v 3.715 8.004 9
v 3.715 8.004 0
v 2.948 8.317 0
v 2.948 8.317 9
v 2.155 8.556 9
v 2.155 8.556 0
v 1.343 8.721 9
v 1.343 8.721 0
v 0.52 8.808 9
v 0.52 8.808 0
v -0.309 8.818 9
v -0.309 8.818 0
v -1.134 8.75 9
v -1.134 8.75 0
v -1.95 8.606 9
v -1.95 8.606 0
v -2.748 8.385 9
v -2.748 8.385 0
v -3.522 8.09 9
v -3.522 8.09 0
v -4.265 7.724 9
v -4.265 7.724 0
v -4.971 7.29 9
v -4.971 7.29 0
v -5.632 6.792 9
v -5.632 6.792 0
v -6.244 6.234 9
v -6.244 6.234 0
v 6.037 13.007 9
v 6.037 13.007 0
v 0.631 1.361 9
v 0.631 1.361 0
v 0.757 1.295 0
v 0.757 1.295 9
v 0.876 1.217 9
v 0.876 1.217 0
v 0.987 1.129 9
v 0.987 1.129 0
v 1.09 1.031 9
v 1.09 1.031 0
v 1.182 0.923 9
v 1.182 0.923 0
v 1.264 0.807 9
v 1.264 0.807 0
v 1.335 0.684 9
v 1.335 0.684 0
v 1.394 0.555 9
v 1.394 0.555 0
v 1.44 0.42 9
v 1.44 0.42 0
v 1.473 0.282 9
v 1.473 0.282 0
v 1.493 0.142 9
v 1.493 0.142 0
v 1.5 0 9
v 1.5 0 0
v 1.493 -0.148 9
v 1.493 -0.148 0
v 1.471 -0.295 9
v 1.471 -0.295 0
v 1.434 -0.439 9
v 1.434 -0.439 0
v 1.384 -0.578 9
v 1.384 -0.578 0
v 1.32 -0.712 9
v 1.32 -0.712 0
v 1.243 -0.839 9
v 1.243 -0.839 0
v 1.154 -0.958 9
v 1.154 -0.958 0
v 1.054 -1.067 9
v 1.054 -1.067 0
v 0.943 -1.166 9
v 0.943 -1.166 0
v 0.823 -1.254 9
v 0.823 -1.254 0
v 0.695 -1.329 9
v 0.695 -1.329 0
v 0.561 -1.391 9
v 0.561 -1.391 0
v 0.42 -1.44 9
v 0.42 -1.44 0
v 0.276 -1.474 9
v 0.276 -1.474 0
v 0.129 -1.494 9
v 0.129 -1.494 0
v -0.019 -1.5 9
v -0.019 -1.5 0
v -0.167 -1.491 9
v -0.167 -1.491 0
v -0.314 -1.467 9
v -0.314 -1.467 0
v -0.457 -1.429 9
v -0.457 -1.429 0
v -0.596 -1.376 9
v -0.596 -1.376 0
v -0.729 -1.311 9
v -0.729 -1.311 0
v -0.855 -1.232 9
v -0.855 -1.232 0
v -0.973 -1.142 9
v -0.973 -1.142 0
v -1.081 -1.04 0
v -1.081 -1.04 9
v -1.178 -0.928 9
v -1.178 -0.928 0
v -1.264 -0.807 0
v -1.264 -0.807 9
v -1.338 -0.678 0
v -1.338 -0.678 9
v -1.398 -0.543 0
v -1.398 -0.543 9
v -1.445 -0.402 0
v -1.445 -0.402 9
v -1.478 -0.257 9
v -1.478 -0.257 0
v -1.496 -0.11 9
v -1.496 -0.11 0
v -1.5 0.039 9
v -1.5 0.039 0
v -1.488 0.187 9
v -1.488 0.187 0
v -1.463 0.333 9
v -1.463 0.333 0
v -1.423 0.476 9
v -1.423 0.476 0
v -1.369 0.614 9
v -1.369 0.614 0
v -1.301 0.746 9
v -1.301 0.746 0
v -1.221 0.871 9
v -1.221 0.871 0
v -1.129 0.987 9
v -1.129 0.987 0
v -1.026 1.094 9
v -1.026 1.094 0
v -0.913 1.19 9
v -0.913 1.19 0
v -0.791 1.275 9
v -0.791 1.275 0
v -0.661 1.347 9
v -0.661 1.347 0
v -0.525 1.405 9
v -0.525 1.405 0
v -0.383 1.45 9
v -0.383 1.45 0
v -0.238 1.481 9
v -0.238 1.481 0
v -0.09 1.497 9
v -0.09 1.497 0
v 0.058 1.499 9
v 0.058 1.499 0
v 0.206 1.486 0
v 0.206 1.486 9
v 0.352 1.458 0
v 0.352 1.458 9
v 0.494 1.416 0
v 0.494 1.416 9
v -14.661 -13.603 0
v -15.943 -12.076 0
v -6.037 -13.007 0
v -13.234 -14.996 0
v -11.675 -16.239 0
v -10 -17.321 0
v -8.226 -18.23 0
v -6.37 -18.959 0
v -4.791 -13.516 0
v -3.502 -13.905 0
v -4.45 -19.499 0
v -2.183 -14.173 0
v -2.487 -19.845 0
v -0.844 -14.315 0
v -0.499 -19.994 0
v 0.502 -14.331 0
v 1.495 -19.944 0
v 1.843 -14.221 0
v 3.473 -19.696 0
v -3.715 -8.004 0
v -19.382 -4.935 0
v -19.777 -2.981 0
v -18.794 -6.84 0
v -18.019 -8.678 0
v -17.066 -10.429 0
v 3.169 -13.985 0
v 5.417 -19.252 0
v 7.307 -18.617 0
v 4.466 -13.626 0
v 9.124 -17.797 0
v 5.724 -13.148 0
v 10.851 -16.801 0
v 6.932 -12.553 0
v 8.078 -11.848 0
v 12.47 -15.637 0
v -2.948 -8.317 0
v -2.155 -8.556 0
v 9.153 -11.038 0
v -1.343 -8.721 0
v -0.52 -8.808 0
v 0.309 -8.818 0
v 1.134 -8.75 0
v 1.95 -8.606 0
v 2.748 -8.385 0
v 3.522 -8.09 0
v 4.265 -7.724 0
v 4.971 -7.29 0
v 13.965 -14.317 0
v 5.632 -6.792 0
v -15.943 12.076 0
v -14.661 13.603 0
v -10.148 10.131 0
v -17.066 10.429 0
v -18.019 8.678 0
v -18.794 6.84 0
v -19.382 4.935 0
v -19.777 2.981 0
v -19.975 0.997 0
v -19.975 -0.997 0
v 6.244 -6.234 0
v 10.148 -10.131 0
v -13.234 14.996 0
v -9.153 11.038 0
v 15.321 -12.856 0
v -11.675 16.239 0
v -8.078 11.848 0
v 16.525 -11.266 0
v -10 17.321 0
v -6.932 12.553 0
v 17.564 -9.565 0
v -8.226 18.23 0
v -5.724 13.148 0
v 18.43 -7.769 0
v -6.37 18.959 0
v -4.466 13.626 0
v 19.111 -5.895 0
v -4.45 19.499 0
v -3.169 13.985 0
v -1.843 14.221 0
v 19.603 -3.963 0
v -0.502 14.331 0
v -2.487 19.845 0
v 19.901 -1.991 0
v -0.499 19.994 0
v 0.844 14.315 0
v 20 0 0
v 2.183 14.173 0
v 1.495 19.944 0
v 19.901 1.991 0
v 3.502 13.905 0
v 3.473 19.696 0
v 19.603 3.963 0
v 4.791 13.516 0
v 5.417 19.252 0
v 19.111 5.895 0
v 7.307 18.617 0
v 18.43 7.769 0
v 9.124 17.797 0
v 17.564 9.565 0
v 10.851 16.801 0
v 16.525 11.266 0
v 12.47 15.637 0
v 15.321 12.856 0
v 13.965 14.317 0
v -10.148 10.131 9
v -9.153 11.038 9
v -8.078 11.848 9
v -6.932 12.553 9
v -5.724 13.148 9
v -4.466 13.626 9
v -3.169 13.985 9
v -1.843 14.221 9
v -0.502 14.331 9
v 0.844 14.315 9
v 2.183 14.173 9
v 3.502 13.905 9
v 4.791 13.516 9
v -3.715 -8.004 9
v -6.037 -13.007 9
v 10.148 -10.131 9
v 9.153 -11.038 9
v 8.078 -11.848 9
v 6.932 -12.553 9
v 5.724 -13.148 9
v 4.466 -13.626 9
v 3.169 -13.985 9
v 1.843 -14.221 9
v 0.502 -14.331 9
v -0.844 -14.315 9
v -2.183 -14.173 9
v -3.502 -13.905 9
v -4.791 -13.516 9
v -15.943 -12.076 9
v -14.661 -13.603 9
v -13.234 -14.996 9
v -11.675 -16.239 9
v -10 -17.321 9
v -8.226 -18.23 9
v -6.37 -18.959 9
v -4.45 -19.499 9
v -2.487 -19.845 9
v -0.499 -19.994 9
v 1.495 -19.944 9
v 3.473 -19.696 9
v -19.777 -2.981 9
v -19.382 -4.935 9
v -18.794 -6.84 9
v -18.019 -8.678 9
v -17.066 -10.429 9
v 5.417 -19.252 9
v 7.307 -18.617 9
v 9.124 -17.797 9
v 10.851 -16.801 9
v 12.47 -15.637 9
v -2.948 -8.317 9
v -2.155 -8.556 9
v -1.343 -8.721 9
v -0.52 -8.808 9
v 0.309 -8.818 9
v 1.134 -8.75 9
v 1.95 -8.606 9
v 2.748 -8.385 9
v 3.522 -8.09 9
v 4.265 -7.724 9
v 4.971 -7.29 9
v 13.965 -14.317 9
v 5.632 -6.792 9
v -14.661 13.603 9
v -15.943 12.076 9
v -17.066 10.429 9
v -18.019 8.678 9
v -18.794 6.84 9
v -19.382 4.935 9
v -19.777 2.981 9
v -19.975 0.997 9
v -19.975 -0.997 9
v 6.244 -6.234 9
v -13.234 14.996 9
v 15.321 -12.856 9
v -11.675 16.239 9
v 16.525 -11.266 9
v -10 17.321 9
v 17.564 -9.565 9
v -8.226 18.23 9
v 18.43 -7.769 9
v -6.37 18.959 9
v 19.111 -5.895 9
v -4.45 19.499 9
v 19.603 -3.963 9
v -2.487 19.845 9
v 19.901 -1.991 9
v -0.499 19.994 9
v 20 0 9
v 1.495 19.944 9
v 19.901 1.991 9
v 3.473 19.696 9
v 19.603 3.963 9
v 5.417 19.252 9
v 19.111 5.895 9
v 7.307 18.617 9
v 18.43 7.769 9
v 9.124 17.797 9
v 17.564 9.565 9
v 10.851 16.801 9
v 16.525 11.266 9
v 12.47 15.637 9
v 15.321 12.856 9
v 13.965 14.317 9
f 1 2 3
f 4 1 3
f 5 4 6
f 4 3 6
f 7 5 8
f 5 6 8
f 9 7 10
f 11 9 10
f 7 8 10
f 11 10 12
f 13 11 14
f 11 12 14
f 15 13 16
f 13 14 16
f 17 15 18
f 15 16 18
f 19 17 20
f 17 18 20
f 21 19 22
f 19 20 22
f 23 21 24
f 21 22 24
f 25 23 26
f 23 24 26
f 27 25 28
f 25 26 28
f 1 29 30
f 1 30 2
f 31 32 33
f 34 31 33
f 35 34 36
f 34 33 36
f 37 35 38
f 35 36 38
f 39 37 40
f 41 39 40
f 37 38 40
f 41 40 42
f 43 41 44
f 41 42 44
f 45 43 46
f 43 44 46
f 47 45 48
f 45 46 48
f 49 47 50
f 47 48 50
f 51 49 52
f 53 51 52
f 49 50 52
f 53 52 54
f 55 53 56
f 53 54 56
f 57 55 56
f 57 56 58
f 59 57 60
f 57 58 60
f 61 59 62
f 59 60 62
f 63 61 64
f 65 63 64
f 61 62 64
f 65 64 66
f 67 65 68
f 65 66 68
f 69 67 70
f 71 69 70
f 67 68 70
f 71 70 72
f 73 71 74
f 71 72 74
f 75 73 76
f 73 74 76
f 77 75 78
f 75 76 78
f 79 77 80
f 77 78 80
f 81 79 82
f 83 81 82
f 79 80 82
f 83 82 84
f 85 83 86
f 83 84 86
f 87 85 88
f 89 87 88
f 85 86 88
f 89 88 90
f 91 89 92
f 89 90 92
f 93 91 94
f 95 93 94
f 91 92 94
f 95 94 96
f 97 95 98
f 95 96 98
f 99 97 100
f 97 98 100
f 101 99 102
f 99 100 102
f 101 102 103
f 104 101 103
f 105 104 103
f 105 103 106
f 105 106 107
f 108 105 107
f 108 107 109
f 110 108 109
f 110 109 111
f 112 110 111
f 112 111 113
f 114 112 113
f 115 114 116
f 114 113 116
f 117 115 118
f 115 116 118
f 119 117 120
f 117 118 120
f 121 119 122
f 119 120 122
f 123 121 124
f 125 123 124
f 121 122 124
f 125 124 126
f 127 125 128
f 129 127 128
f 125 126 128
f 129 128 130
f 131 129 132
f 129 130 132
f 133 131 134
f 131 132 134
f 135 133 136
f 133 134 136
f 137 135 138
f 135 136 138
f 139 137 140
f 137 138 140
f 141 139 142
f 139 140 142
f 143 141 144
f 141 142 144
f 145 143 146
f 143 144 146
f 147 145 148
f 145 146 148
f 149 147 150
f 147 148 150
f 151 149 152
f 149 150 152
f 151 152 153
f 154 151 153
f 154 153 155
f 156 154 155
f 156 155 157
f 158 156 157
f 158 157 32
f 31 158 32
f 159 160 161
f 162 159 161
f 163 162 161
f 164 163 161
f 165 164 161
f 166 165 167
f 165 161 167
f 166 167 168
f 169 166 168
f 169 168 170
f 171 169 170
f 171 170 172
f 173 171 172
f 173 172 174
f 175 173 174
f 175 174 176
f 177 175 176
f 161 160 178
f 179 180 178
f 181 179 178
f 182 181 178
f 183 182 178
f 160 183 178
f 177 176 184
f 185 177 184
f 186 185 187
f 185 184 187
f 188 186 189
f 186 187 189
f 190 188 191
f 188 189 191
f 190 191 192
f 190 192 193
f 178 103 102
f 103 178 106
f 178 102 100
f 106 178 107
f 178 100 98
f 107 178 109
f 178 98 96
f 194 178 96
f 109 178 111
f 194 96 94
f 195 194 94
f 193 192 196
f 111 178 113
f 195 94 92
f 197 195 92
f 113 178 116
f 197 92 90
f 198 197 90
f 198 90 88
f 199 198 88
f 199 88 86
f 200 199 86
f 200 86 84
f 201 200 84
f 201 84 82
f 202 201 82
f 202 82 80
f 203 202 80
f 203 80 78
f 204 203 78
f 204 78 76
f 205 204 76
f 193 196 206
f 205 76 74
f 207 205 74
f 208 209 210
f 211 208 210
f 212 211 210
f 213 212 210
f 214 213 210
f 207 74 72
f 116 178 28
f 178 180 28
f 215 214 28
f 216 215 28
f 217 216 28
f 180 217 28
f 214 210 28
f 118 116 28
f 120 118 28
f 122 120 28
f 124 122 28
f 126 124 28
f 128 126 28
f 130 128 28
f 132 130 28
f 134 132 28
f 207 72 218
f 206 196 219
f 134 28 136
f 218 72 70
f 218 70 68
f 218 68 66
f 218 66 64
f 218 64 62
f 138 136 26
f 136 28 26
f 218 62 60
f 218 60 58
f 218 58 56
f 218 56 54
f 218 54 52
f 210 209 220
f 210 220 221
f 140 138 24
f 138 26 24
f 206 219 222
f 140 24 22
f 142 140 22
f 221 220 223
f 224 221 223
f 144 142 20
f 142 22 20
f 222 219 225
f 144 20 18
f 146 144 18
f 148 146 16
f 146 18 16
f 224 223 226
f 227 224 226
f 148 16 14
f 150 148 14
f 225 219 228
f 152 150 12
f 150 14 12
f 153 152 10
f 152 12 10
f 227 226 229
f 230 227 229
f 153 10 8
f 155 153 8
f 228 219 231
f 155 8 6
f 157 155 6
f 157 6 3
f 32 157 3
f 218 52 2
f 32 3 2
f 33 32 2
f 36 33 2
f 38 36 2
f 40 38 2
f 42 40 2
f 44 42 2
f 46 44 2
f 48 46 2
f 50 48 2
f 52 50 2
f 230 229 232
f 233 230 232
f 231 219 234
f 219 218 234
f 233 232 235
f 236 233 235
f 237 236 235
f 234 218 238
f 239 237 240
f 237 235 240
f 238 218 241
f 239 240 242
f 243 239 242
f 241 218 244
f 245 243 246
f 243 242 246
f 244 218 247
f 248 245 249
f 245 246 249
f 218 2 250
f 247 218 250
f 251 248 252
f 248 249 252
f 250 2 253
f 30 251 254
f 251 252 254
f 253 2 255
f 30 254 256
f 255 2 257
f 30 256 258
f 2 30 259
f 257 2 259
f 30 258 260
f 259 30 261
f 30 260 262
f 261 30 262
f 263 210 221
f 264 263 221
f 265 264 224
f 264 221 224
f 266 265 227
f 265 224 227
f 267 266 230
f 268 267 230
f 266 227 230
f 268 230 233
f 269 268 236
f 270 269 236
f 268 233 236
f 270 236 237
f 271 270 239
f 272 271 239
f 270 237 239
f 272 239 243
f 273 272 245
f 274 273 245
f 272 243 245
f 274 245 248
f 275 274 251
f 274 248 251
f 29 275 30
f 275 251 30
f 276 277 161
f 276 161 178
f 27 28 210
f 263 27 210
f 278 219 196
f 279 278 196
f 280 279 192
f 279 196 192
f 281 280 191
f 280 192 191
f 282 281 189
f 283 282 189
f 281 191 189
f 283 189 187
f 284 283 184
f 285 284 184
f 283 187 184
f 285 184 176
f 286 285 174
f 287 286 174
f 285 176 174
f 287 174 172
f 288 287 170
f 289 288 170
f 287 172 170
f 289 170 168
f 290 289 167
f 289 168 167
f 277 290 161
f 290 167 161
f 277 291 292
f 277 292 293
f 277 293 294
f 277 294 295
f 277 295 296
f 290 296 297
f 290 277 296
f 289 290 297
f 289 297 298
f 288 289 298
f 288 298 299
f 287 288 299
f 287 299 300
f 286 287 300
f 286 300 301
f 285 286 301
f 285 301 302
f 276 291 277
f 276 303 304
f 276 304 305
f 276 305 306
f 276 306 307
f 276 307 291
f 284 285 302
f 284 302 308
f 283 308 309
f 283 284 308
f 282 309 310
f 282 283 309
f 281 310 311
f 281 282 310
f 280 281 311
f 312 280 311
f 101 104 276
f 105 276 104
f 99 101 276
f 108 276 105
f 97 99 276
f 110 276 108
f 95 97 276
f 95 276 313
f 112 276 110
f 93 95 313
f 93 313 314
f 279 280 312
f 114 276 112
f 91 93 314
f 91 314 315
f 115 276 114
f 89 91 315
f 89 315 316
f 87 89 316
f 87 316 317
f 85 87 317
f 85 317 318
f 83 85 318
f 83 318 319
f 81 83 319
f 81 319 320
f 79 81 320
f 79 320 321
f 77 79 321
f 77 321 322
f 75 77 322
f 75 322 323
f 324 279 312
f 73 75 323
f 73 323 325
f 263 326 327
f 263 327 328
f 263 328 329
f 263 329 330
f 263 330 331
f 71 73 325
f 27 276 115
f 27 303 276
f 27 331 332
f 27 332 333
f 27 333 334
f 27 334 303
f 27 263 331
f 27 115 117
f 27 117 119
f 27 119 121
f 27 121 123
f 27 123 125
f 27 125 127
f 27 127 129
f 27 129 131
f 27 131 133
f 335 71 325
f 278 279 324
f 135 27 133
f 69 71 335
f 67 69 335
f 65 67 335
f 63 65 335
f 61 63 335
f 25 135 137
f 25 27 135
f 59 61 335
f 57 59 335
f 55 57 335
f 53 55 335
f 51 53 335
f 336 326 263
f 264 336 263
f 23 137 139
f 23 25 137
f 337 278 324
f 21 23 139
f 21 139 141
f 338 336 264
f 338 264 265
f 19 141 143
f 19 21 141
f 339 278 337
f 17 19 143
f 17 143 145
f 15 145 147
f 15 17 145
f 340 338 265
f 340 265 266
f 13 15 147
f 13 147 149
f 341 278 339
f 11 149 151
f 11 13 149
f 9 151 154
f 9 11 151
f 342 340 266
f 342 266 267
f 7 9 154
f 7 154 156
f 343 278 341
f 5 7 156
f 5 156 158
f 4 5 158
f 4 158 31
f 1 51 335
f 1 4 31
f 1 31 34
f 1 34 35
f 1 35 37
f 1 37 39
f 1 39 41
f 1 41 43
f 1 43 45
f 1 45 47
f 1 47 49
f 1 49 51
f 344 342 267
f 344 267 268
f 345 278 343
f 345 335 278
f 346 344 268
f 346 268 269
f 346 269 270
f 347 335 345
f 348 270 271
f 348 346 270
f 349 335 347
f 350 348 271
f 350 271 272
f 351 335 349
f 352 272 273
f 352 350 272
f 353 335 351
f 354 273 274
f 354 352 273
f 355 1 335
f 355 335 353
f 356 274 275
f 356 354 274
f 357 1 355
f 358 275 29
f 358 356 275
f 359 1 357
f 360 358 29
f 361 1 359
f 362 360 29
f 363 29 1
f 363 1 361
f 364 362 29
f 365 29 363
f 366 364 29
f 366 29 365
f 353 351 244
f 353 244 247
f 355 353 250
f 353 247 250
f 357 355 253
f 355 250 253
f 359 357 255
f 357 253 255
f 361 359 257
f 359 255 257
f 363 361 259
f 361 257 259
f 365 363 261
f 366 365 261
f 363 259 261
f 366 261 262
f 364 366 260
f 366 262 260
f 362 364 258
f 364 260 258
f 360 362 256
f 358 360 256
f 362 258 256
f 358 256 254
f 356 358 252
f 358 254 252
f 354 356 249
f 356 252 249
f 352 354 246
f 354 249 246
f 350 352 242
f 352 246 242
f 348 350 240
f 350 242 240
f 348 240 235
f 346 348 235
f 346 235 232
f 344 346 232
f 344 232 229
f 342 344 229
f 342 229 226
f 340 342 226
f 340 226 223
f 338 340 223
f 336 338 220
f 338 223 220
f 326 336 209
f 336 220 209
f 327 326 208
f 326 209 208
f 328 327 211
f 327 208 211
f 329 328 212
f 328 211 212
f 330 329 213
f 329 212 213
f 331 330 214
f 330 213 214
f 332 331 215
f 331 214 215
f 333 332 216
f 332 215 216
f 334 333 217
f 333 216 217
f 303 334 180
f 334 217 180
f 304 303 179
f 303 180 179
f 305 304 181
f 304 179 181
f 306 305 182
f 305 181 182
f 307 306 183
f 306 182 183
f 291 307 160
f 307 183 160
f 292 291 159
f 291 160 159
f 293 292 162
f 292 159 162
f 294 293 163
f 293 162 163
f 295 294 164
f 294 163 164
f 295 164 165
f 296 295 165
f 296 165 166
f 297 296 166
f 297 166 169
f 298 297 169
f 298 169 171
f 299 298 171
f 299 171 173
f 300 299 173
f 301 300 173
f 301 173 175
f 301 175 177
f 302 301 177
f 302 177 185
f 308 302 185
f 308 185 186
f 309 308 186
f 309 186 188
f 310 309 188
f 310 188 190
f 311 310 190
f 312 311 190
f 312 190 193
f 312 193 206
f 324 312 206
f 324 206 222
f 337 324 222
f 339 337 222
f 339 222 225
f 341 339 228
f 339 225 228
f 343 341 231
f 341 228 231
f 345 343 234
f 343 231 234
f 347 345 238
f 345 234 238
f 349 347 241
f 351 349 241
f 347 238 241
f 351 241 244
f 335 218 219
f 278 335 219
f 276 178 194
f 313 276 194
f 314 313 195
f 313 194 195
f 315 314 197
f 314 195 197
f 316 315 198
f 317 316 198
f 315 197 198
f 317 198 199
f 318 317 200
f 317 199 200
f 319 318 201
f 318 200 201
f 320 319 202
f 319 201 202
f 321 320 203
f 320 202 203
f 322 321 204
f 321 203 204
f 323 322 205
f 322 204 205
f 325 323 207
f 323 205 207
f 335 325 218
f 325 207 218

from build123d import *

# Parameters (mm, degrees)
F0_R     = 20
F1_DEPTH = 9


# Not quite as in the source:
# - a feature names something its author has since deleted; it is built from what else it names


with BuildPart() as f1:
    # F0 (on Top) → F1 (new body)
    with BuildSketch(Plane.XY):
        Circle(F0_R)
        with BuildLine():
            Line((-6.0368402564, -13.007011068), (-3.7146515348, -8.0036097652))
            ThreePointArc((-3.7146515348, -8.0036097652), (1.5436452389, -8.6875522833), (6.244462038, -6.2340275228))
            Line((6.244462038, -6.2340275228), (10.1481443029, -10.1311867228))
            ThreePointArc((10.1481443029, -10.1311867228), (2.5086443863, -14.1185155221), (-6.0368402564, -13.007011068))
        make_face(mode=Mode.SUBTRACT)
        with BuildLine():
            Line((6.0368402564, 13.007011068), (3.7146515348, 8.0036097652))
            ThreePointArc((3.7146515348, 8.0036097652), (-1.5436452389, 8.6875522833), (-6.244462038, 6.2340275228))
            Line((-6.244462038, 6.2340275228), (-10.1481443029, 10.1311867228))
            ThreePointArc((-10.1481443029, 10.1311867228), (-2.5086443863, 14.1185155221), (6.0368402564, 13.007011068))
        make_face(mode=Mode.SUBTRACT)
        with BuildLine():
            ThreePointArc((0.6314837286, 1.3605985082), (1.2643626048, 0.8070856234), (1.5, 0))
            ThreePointArc((1.5, 0), (-1.2643626048, -0.8070856234), (0.6314837286, 1.3605985082))
        make_face(mode=Mode.SUBTRACT)
    extrude(amount=F1_DEPTH)


solid = f1.part
